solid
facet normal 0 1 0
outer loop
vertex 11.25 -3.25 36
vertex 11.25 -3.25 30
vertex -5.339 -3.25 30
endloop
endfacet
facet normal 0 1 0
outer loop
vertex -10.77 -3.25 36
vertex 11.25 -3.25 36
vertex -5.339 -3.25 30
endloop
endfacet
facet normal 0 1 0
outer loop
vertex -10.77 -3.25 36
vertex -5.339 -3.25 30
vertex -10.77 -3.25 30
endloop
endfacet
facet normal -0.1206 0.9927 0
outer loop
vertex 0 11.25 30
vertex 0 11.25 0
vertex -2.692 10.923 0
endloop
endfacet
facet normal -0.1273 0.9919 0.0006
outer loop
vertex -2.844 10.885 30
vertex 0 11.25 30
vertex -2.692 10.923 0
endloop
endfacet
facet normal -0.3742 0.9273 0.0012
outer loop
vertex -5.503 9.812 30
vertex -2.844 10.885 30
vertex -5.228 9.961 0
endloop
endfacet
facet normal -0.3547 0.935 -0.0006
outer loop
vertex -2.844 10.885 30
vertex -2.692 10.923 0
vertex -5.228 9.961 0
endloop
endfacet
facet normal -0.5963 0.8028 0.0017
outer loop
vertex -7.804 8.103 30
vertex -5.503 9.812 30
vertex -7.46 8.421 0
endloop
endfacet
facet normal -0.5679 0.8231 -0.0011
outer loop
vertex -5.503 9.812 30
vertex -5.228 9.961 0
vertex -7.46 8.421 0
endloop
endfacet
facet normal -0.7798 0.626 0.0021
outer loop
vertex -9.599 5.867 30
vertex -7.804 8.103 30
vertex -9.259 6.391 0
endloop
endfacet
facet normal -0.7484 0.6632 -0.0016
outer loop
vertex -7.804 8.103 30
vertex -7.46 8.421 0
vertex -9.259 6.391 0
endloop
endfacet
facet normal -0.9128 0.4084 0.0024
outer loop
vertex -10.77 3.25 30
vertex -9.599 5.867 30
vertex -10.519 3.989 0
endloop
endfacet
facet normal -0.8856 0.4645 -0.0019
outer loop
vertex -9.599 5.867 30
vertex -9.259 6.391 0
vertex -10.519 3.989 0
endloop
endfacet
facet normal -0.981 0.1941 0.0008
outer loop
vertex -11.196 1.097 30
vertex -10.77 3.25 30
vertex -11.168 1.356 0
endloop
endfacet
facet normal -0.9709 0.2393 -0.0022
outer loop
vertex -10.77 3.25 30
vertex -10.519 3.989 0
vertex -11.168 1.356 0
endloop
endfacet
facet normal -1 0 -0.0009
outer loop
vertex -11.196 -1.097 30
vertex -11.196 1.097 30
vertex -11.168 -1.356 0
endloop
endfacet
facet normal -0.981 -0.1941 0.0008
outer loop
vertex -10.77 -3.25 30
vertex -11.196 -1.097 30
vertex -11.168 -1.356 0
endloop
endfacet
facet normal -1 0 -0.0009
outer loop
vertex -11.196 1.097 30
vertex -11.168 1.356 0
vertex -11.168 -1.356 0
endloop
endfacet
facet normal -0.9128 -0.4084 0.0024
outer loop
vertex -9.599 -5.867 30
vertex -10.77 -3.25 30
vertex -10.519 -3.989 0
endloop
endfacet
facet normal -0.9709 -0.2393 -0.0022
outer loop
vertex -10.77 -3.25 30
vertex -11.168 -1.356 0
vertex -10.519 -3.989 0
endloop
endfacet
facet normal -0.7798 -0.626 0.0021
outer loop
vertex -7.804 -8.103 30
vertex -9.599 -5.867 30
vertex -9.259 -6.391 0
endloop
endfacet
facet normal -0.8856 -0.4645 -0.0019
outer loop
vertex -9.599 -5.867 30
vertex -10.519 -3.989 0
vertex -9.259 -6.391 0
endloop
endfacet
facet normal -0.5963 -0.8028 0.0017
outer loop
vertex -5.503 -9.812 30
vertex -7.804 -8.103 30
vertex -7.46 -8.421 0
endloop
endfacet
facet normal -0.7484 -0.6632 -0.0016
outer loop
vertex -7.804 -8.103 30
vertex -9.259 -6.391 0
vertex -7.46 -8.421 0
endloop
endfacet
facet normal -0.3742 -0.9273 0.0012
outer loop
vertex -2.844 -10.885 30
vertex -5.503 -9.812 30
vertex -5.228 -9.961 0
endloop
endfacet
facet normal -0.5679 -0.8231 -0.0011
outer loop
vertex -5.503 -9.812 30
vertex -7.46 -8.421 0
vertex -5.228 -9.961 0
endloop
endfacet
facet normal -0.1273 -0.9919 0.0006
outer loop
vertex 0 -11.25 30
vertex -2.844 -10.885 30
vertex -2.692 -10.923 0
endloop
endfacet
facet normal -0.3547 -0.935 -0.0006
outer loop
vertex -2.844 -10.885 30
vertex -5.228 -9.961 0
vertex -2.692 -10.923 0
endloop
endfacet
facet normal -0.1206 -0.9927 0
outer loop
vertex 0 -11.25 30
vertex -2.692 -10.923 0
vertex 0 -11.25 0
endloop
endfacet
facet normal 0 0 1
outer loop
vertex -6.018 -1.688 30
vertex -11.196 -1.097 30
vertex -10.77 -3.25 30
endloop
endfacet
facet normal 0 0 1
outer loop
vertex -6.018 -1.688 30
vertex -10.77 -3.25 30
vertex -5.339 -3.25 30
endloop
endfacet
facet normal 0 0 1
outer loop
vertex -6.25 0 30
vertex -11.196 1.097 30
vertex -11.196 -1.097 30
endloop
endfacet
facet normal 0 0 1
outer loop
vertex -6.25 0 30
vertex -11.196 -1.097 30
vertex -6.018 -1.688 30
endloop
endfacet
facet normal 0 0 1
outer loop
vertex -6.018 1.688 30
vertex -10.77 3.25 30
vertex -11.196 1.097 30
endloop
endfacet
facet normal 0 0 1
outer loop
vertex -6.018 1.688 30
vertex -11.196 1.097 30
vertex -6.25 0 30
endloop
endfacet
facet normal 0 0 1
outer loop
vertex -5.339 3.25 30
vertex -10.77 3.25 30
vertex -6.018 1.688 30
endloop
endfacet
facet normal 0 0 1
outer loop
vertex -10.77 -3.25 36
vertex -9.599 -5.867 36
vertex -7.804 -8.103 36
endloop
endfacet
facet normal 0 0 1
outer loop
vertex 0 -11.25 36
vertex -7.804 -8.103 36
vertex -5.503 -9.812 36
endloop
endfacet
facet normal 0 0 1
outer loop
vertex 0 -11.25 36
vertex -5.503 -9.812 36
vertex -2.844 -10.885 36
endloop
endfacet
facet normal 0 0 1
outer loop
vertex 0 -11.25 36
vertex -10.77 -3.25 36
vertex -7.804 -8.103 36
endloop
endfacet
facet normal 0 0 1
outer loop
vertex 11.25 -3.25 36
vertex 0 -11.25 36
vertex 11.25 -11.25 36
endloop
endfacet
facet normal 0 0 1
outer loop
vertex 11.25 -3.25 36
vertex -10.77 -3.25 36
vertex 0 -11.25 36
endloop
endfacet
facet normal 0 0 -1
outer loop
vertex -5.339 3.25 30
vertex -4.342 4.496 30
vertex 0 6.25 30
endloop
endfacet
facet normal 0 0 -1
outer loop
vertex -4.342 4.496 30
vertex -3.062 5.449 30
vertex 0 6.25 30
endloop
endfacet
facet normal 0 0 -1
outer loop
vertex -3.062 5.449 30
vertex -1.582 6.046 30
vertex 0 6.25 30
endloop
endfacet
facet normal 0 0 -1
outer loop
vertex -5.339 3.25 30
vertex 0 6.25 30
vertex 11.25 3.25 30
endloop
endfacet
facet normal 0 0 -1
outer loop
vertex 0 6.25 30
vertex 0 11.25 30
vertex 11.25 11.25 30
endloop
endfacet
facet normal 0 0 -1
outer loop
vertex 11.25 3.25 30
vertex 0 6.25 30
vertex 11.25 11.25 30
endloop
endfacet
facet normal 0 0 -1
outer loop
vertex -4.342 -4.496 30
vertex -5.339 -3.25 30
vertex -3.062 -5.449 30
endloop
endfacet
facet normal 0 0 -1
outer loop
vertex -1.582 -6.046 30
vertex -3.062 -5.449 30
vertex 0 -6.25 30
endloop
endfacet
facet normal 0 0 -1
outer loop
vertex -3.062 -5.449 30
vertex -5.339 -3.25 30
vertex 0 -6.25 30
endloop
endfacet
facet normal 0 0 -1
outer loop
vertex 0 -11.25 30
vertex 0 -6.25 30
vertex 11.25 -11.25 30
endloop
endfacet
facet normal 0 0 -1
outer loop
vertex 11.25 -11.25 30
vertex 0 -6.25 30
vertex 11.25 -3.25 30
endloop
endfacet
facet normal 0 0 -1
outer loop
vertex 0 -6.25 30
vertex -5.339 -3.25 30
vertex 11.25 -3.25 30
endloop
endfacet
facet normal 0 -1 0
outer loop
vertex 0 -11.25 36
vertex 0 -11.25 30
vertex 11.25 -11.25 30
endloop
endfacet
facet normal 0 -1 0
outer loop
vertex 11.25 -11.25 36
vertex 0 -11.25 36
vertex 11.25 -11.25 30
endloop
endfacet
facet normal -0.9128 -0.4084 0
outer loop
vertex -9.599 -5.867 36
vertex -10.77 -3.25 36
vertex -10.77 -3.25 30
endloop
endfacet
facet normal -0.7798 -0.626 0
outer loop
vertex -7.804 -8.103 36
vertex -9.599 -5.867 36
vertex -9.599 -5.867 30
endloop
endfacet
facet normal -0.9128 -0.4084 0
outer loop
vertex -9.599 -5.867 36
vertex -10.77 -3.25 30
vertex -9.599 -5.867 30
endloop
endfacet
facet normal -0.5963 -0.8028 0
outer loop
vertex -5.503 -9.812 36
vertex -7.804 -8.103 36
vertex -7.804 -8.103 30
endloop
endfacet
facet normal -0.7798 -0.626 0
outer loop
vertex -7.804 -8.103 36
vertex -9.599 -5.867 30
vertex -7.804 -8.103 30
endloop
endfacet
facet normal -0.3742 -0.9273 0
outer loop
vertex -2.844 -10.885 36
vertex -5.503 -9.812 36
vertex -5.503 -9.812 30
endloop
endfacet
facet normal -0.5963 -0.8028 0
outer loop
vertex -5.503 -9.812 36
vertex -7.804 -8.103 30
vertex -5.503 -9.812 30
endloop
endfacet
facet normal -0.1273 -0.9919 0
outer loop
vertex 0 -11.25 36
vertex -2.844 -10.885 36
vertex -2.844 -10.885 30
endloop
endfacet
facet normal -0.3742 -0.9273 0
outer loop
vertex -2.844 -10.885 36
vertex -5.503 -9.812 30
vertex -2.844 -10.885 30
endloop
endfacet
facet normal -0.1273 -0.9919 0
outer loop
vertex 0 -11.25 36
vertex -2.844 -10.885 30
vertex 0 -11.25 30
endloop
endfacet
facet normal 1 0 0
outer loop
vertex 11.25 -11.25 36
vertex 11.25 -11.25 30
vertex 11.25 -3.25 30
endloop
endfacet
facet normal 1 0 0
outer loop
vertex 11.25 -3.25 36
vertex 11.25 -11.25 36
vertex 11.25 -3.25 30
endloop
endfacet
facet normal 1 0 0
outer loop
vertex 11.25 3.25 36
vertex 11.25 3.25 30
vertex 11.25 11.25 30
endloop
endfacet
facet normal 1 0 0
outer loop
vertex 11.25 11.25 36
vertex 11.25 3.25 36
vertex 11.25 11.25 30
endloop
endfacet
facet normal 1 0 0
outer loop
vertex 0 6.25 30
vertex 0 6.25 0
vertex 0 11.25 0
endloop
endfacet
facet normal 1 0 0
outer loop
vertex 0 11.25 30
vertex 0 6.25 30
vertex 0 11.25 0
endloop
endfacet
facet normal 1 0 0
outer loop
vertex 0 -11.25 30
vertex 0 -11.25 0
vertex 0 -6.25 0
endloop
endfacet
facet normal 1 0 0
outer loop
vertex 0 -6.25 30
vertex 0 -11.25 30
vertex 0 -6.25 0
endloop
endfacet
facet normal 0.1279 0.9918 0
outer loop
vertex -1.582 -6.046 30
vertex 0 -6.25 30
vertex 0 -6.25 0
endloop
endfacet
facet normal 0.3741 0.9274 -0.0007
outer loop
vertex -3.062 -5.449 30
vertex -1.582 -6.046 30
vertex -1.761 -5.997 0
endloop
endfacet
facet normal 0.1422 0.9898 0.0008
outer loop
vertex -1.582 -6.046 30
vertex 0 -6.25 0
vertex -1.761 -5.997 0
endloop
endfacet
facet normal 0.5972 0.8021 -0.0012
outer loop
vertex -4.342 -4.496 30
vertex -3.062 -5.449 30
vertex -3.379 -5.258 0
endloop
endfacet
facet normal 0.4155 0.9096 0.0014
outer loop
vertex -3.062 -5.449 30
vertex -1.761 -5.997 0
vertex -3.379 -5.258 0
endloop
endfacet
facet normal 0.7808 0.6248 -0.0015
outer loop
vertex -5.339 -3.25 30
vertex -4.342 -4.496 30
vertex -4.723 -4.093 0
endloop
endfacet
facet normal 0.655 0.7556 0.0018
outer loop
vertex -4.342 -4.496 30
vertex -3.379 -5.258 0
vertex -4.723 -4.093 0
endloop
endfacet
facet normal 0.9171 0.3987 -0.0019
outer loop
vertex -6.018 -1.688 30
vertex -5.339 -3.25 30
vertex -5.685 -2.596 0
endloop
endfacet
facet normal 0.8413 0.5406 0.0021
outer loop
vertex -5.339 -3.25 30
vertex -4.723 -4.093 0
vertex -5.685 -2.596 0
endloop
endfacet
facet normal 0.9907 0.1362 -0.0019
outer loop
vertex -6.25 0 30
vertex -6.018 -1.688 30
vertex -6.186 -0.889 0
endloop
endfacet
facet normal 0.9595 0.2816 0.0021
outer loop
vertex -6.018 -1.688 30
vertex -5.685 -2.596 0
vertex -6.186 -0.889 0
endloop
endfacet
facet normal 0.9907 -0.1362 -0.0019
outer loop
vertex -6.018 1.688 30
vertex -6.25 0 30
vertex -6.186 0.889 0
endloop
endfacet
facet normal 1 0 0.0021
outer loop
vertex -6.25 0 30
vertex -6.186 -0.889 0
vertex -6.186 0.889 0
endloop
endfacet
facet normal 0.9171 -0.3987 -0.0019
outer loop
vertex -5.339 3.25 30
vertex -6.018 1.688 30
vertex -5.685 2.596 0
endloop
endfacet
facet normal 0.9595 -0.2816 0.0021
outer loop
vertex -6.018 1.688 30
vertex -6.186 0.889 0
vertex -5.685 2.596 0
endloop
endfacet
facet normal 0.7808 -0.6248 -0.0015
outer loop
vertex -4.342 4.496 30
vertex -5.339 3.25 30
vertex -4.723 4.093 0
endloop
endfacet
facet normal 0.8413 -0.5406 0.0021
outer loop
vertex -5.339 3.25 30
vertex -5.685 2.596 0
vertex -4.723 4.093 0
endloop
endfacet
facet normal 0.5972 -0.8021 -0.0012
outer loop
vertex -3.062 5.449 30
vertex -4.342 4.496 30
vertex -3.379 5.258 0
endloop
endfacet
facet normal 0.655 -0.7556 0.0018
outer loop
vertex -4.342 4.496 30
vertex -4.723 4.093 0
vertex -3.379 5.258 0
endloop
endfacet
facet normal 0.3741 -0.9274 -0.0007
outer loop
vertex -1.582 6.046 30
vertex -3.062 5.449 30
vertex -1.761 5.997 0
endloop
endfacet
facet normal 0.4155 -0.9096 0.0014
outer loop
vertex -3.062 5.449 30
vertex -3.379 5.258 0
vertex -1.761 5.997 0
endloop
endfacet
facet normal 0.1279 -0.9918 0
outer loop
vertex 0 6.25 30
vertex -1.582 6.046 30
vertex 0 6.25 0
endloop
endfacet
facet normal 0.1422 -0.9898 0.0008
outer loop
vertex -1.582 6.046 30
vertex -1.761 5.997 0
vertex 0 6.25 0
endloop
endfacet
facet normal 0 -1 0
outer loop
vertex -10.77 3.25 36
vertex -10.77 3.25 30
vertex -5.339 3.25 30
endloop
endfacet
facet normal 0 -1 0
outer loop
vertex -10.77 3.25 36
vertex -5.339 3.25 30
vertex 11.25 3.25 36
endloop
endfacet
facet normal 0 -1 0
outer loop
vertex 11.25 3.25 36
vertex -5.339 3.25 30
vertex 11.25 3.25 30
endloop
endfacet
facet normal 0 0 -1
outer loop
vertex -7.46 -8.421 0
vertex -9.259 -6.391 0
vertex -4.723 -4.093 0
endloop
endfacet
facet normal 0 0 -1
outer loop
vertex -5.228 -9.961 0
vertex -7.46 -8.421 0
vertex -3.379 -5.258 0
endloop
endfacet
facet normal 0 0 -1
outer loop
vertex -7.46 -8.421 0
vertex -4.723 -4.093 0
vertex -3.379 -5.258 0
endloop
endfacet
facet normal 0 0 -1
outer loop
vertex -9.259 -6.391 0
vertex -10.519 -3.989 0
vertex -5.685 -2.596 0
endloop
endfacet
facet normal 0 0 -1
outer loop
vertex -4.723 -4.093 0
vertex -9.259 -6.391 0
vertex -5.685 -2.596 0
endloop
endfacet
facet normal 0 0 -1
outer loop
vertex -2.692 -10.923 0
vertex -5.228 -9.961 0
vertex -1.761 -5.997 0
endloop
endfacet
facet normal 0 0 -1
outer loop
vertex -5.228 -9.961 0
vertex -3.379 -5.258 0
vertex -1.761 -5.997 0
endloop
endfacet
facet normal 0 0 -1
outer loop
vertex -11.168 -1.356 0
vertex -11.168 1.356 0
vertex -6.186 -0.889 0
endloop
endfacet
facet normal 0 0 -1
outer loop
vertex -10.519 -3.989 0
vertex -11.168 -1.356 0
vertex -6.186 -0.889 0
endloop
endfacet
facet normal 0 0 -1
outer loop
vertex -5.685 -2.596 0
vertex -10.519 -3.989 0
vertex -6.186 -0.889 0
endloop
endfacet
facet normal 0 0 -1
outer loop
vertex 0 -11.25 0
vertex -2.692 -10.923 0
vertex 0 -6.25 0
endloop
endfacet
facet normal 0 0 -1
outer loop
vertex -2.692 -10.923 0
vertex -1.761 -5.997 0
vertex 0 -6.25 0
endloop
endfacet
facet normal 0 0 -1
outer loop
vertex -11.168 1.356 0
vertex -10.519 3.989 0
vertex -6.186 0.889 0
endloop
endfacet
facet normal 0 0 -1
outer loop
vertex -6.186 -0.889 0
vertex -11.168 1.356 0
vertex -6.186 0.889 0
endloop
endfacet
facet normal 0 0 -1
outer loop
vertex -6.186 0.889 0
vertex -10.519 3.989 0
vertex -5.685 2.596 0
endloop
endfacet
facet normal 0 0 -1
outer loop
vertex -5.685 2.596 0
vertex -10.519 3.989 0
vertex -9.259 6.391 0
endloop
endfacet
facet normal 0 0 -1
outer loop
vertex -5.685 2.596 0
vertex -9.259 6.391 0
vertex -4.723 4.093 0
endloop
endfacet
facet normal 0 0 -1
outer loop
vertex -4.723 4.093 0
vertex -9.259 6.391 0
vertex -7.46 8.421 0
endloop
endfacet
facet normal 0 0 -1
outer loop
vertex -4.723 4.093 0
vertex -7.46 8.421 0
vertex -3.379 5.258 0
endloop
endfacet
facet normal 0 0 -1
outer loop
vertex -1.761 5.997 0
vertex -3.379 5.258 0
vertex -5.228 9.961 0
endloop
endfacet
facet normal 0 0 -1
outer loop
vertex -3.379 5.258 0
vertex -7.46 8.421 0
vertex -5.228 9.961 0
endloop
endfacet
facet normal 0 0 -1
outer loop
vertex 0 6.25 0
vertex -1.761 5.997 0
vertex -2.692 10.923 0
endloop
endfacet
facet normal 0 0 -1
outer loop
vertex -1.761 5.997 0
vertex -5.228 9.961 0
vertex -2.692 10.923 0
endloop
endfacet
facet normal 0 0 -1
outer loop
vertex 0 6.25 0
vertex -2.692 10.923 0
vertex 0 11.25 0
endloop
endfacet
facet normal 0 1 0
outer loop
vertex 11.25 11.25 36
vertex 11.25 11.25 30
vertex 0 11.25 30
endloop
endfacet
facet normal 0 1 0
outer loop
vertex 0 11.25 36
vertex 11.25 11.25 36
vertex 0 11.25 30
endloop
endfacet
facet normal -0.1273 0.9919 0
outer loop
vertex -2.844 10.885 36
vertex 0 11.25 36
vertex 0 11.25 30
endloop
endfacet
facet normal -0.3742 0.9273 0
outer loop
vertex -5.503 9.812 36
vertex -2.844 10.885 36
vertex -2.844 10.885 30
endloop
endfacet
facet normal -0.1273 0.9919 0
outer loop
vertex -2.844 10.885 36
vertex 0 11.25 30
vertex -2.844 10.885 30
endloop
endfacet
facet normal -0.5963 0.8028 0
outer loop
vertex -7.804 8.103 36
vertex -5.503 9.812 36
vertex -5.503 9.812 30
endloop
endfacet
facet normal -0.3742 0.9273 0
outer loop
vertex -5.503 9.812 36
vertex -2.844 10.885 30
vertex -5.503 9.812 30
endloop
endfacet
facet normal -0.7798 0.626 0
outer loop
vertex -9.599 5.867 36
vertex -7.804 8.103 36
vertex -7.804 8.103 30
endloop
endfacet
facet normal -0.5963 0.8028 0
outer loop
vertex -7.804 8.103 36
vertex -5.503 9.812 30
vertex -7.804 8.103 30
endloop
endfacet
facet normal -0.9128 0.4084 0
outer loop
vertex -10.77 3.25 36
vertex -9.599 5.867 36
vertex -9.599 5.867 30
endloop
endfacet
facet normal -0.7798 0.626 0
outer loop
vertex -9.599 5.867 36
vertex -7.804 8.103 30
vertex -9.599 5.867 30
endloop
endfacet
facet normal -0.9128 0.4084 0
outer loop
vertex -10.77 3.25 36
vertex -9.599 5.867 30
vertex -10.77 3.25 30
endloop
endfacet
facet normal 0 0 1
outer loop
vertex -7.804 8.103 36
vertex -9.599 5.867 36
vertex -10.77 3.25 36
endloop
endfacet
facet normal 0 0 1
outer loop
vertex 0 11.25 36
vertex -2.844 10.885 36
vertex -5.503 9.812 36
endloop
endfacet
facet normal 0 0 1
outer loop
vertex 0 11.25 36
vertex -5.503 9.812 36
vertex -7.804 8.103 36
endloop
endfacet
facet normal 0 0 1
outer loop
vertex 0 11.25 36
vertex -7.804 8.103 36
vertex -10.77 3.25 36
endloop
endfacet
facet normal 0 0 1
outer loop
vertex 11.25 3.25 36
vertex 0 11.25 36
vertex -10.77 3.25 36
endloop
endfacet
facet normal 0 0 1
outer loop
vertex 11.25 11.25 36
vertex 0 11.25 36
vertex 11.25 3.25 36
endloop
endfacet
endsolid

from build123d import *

# Parameters (mm, degrees)
EXTRUDE_1_DEPTH = 30
EXTRUDE_2_DEPTH = 6


with BuildPart() as part:
    # 草图1 → 凸台-拉伸1 (new body)
    with BuildSketch(Plane.XY):
        with BuildLine():
            Line((0, 6.25), (0, 11.25))
            ThreePointArc((0, 11.25), (-11.25, 0), (0, -11.25))
            Line((0, -11.25), (0, -6.25))
            ThreePointArc((0, -6.25), (-6.25, 0), (0, 6.25))
        make_face()
    extrude(amount=EXTRUDE_1_DEPTH)

    # 草图2 → 凸台-拉伸2 (add)
    with BuildSketch(Plane.XY.offset(30)):
        with BuildLine():
            Line((0, 6.25), (0, 11.25))
            ThreePointArc((0, 11.25), (-6.708203932, 9.031195934), (-10.770329614, 3.25))
            Line((-10.770329614, 3.25), (-5.338539126, 3.25))
            ThreePointArc((-5.338539126, 3.25), (-3.061862178, 5.448623679), (0, 6.25))
        make_face()
        with BuildLine():
            Line((11.25, 3.25), (11.25, 11.25))
            Line((11.25, 11.25), (0, 11.25))
            Line((0, 11.25), (0, 6.25))
            ThreePointArc((0, 6.25), (-3.061862178, 5.448623679), (-5.338539126, 3.25))
            Line((-5.338539126, 3.25), (11.25, 3.25))
        make_face()
        with BuildLine():
            ThreePointArc((0, -6.25), (-3.061862178, -5.448623679), (-5.338539126, -3.25))
            Line((-5.338539126, -3.25), (-10.770329614, -3.25))
            ThreePointArc((-10.770329614, -3.25), (-6.708203932, -9.031195934), (0, -11.25))
            Line((0, -11.25), (0, -6.25))
        make_face()
        with BuildLine():
            Line((11.25, -11.25), (11.25, -3.25))
            Line((11.25, -3.25), (-5.338539126, -3.25))
            ThreePointArc((-5.338539126, -3.25), (-3.061862178, -5.448623679), (0, -6.25))
            Line((0, -6.25), (0, -11.25))
            Line((0, -11.25), (11.25, -11.25))
        make_face()
    extrude(amount=EXTRUDE_2_DEPTH)


solid = part.part
